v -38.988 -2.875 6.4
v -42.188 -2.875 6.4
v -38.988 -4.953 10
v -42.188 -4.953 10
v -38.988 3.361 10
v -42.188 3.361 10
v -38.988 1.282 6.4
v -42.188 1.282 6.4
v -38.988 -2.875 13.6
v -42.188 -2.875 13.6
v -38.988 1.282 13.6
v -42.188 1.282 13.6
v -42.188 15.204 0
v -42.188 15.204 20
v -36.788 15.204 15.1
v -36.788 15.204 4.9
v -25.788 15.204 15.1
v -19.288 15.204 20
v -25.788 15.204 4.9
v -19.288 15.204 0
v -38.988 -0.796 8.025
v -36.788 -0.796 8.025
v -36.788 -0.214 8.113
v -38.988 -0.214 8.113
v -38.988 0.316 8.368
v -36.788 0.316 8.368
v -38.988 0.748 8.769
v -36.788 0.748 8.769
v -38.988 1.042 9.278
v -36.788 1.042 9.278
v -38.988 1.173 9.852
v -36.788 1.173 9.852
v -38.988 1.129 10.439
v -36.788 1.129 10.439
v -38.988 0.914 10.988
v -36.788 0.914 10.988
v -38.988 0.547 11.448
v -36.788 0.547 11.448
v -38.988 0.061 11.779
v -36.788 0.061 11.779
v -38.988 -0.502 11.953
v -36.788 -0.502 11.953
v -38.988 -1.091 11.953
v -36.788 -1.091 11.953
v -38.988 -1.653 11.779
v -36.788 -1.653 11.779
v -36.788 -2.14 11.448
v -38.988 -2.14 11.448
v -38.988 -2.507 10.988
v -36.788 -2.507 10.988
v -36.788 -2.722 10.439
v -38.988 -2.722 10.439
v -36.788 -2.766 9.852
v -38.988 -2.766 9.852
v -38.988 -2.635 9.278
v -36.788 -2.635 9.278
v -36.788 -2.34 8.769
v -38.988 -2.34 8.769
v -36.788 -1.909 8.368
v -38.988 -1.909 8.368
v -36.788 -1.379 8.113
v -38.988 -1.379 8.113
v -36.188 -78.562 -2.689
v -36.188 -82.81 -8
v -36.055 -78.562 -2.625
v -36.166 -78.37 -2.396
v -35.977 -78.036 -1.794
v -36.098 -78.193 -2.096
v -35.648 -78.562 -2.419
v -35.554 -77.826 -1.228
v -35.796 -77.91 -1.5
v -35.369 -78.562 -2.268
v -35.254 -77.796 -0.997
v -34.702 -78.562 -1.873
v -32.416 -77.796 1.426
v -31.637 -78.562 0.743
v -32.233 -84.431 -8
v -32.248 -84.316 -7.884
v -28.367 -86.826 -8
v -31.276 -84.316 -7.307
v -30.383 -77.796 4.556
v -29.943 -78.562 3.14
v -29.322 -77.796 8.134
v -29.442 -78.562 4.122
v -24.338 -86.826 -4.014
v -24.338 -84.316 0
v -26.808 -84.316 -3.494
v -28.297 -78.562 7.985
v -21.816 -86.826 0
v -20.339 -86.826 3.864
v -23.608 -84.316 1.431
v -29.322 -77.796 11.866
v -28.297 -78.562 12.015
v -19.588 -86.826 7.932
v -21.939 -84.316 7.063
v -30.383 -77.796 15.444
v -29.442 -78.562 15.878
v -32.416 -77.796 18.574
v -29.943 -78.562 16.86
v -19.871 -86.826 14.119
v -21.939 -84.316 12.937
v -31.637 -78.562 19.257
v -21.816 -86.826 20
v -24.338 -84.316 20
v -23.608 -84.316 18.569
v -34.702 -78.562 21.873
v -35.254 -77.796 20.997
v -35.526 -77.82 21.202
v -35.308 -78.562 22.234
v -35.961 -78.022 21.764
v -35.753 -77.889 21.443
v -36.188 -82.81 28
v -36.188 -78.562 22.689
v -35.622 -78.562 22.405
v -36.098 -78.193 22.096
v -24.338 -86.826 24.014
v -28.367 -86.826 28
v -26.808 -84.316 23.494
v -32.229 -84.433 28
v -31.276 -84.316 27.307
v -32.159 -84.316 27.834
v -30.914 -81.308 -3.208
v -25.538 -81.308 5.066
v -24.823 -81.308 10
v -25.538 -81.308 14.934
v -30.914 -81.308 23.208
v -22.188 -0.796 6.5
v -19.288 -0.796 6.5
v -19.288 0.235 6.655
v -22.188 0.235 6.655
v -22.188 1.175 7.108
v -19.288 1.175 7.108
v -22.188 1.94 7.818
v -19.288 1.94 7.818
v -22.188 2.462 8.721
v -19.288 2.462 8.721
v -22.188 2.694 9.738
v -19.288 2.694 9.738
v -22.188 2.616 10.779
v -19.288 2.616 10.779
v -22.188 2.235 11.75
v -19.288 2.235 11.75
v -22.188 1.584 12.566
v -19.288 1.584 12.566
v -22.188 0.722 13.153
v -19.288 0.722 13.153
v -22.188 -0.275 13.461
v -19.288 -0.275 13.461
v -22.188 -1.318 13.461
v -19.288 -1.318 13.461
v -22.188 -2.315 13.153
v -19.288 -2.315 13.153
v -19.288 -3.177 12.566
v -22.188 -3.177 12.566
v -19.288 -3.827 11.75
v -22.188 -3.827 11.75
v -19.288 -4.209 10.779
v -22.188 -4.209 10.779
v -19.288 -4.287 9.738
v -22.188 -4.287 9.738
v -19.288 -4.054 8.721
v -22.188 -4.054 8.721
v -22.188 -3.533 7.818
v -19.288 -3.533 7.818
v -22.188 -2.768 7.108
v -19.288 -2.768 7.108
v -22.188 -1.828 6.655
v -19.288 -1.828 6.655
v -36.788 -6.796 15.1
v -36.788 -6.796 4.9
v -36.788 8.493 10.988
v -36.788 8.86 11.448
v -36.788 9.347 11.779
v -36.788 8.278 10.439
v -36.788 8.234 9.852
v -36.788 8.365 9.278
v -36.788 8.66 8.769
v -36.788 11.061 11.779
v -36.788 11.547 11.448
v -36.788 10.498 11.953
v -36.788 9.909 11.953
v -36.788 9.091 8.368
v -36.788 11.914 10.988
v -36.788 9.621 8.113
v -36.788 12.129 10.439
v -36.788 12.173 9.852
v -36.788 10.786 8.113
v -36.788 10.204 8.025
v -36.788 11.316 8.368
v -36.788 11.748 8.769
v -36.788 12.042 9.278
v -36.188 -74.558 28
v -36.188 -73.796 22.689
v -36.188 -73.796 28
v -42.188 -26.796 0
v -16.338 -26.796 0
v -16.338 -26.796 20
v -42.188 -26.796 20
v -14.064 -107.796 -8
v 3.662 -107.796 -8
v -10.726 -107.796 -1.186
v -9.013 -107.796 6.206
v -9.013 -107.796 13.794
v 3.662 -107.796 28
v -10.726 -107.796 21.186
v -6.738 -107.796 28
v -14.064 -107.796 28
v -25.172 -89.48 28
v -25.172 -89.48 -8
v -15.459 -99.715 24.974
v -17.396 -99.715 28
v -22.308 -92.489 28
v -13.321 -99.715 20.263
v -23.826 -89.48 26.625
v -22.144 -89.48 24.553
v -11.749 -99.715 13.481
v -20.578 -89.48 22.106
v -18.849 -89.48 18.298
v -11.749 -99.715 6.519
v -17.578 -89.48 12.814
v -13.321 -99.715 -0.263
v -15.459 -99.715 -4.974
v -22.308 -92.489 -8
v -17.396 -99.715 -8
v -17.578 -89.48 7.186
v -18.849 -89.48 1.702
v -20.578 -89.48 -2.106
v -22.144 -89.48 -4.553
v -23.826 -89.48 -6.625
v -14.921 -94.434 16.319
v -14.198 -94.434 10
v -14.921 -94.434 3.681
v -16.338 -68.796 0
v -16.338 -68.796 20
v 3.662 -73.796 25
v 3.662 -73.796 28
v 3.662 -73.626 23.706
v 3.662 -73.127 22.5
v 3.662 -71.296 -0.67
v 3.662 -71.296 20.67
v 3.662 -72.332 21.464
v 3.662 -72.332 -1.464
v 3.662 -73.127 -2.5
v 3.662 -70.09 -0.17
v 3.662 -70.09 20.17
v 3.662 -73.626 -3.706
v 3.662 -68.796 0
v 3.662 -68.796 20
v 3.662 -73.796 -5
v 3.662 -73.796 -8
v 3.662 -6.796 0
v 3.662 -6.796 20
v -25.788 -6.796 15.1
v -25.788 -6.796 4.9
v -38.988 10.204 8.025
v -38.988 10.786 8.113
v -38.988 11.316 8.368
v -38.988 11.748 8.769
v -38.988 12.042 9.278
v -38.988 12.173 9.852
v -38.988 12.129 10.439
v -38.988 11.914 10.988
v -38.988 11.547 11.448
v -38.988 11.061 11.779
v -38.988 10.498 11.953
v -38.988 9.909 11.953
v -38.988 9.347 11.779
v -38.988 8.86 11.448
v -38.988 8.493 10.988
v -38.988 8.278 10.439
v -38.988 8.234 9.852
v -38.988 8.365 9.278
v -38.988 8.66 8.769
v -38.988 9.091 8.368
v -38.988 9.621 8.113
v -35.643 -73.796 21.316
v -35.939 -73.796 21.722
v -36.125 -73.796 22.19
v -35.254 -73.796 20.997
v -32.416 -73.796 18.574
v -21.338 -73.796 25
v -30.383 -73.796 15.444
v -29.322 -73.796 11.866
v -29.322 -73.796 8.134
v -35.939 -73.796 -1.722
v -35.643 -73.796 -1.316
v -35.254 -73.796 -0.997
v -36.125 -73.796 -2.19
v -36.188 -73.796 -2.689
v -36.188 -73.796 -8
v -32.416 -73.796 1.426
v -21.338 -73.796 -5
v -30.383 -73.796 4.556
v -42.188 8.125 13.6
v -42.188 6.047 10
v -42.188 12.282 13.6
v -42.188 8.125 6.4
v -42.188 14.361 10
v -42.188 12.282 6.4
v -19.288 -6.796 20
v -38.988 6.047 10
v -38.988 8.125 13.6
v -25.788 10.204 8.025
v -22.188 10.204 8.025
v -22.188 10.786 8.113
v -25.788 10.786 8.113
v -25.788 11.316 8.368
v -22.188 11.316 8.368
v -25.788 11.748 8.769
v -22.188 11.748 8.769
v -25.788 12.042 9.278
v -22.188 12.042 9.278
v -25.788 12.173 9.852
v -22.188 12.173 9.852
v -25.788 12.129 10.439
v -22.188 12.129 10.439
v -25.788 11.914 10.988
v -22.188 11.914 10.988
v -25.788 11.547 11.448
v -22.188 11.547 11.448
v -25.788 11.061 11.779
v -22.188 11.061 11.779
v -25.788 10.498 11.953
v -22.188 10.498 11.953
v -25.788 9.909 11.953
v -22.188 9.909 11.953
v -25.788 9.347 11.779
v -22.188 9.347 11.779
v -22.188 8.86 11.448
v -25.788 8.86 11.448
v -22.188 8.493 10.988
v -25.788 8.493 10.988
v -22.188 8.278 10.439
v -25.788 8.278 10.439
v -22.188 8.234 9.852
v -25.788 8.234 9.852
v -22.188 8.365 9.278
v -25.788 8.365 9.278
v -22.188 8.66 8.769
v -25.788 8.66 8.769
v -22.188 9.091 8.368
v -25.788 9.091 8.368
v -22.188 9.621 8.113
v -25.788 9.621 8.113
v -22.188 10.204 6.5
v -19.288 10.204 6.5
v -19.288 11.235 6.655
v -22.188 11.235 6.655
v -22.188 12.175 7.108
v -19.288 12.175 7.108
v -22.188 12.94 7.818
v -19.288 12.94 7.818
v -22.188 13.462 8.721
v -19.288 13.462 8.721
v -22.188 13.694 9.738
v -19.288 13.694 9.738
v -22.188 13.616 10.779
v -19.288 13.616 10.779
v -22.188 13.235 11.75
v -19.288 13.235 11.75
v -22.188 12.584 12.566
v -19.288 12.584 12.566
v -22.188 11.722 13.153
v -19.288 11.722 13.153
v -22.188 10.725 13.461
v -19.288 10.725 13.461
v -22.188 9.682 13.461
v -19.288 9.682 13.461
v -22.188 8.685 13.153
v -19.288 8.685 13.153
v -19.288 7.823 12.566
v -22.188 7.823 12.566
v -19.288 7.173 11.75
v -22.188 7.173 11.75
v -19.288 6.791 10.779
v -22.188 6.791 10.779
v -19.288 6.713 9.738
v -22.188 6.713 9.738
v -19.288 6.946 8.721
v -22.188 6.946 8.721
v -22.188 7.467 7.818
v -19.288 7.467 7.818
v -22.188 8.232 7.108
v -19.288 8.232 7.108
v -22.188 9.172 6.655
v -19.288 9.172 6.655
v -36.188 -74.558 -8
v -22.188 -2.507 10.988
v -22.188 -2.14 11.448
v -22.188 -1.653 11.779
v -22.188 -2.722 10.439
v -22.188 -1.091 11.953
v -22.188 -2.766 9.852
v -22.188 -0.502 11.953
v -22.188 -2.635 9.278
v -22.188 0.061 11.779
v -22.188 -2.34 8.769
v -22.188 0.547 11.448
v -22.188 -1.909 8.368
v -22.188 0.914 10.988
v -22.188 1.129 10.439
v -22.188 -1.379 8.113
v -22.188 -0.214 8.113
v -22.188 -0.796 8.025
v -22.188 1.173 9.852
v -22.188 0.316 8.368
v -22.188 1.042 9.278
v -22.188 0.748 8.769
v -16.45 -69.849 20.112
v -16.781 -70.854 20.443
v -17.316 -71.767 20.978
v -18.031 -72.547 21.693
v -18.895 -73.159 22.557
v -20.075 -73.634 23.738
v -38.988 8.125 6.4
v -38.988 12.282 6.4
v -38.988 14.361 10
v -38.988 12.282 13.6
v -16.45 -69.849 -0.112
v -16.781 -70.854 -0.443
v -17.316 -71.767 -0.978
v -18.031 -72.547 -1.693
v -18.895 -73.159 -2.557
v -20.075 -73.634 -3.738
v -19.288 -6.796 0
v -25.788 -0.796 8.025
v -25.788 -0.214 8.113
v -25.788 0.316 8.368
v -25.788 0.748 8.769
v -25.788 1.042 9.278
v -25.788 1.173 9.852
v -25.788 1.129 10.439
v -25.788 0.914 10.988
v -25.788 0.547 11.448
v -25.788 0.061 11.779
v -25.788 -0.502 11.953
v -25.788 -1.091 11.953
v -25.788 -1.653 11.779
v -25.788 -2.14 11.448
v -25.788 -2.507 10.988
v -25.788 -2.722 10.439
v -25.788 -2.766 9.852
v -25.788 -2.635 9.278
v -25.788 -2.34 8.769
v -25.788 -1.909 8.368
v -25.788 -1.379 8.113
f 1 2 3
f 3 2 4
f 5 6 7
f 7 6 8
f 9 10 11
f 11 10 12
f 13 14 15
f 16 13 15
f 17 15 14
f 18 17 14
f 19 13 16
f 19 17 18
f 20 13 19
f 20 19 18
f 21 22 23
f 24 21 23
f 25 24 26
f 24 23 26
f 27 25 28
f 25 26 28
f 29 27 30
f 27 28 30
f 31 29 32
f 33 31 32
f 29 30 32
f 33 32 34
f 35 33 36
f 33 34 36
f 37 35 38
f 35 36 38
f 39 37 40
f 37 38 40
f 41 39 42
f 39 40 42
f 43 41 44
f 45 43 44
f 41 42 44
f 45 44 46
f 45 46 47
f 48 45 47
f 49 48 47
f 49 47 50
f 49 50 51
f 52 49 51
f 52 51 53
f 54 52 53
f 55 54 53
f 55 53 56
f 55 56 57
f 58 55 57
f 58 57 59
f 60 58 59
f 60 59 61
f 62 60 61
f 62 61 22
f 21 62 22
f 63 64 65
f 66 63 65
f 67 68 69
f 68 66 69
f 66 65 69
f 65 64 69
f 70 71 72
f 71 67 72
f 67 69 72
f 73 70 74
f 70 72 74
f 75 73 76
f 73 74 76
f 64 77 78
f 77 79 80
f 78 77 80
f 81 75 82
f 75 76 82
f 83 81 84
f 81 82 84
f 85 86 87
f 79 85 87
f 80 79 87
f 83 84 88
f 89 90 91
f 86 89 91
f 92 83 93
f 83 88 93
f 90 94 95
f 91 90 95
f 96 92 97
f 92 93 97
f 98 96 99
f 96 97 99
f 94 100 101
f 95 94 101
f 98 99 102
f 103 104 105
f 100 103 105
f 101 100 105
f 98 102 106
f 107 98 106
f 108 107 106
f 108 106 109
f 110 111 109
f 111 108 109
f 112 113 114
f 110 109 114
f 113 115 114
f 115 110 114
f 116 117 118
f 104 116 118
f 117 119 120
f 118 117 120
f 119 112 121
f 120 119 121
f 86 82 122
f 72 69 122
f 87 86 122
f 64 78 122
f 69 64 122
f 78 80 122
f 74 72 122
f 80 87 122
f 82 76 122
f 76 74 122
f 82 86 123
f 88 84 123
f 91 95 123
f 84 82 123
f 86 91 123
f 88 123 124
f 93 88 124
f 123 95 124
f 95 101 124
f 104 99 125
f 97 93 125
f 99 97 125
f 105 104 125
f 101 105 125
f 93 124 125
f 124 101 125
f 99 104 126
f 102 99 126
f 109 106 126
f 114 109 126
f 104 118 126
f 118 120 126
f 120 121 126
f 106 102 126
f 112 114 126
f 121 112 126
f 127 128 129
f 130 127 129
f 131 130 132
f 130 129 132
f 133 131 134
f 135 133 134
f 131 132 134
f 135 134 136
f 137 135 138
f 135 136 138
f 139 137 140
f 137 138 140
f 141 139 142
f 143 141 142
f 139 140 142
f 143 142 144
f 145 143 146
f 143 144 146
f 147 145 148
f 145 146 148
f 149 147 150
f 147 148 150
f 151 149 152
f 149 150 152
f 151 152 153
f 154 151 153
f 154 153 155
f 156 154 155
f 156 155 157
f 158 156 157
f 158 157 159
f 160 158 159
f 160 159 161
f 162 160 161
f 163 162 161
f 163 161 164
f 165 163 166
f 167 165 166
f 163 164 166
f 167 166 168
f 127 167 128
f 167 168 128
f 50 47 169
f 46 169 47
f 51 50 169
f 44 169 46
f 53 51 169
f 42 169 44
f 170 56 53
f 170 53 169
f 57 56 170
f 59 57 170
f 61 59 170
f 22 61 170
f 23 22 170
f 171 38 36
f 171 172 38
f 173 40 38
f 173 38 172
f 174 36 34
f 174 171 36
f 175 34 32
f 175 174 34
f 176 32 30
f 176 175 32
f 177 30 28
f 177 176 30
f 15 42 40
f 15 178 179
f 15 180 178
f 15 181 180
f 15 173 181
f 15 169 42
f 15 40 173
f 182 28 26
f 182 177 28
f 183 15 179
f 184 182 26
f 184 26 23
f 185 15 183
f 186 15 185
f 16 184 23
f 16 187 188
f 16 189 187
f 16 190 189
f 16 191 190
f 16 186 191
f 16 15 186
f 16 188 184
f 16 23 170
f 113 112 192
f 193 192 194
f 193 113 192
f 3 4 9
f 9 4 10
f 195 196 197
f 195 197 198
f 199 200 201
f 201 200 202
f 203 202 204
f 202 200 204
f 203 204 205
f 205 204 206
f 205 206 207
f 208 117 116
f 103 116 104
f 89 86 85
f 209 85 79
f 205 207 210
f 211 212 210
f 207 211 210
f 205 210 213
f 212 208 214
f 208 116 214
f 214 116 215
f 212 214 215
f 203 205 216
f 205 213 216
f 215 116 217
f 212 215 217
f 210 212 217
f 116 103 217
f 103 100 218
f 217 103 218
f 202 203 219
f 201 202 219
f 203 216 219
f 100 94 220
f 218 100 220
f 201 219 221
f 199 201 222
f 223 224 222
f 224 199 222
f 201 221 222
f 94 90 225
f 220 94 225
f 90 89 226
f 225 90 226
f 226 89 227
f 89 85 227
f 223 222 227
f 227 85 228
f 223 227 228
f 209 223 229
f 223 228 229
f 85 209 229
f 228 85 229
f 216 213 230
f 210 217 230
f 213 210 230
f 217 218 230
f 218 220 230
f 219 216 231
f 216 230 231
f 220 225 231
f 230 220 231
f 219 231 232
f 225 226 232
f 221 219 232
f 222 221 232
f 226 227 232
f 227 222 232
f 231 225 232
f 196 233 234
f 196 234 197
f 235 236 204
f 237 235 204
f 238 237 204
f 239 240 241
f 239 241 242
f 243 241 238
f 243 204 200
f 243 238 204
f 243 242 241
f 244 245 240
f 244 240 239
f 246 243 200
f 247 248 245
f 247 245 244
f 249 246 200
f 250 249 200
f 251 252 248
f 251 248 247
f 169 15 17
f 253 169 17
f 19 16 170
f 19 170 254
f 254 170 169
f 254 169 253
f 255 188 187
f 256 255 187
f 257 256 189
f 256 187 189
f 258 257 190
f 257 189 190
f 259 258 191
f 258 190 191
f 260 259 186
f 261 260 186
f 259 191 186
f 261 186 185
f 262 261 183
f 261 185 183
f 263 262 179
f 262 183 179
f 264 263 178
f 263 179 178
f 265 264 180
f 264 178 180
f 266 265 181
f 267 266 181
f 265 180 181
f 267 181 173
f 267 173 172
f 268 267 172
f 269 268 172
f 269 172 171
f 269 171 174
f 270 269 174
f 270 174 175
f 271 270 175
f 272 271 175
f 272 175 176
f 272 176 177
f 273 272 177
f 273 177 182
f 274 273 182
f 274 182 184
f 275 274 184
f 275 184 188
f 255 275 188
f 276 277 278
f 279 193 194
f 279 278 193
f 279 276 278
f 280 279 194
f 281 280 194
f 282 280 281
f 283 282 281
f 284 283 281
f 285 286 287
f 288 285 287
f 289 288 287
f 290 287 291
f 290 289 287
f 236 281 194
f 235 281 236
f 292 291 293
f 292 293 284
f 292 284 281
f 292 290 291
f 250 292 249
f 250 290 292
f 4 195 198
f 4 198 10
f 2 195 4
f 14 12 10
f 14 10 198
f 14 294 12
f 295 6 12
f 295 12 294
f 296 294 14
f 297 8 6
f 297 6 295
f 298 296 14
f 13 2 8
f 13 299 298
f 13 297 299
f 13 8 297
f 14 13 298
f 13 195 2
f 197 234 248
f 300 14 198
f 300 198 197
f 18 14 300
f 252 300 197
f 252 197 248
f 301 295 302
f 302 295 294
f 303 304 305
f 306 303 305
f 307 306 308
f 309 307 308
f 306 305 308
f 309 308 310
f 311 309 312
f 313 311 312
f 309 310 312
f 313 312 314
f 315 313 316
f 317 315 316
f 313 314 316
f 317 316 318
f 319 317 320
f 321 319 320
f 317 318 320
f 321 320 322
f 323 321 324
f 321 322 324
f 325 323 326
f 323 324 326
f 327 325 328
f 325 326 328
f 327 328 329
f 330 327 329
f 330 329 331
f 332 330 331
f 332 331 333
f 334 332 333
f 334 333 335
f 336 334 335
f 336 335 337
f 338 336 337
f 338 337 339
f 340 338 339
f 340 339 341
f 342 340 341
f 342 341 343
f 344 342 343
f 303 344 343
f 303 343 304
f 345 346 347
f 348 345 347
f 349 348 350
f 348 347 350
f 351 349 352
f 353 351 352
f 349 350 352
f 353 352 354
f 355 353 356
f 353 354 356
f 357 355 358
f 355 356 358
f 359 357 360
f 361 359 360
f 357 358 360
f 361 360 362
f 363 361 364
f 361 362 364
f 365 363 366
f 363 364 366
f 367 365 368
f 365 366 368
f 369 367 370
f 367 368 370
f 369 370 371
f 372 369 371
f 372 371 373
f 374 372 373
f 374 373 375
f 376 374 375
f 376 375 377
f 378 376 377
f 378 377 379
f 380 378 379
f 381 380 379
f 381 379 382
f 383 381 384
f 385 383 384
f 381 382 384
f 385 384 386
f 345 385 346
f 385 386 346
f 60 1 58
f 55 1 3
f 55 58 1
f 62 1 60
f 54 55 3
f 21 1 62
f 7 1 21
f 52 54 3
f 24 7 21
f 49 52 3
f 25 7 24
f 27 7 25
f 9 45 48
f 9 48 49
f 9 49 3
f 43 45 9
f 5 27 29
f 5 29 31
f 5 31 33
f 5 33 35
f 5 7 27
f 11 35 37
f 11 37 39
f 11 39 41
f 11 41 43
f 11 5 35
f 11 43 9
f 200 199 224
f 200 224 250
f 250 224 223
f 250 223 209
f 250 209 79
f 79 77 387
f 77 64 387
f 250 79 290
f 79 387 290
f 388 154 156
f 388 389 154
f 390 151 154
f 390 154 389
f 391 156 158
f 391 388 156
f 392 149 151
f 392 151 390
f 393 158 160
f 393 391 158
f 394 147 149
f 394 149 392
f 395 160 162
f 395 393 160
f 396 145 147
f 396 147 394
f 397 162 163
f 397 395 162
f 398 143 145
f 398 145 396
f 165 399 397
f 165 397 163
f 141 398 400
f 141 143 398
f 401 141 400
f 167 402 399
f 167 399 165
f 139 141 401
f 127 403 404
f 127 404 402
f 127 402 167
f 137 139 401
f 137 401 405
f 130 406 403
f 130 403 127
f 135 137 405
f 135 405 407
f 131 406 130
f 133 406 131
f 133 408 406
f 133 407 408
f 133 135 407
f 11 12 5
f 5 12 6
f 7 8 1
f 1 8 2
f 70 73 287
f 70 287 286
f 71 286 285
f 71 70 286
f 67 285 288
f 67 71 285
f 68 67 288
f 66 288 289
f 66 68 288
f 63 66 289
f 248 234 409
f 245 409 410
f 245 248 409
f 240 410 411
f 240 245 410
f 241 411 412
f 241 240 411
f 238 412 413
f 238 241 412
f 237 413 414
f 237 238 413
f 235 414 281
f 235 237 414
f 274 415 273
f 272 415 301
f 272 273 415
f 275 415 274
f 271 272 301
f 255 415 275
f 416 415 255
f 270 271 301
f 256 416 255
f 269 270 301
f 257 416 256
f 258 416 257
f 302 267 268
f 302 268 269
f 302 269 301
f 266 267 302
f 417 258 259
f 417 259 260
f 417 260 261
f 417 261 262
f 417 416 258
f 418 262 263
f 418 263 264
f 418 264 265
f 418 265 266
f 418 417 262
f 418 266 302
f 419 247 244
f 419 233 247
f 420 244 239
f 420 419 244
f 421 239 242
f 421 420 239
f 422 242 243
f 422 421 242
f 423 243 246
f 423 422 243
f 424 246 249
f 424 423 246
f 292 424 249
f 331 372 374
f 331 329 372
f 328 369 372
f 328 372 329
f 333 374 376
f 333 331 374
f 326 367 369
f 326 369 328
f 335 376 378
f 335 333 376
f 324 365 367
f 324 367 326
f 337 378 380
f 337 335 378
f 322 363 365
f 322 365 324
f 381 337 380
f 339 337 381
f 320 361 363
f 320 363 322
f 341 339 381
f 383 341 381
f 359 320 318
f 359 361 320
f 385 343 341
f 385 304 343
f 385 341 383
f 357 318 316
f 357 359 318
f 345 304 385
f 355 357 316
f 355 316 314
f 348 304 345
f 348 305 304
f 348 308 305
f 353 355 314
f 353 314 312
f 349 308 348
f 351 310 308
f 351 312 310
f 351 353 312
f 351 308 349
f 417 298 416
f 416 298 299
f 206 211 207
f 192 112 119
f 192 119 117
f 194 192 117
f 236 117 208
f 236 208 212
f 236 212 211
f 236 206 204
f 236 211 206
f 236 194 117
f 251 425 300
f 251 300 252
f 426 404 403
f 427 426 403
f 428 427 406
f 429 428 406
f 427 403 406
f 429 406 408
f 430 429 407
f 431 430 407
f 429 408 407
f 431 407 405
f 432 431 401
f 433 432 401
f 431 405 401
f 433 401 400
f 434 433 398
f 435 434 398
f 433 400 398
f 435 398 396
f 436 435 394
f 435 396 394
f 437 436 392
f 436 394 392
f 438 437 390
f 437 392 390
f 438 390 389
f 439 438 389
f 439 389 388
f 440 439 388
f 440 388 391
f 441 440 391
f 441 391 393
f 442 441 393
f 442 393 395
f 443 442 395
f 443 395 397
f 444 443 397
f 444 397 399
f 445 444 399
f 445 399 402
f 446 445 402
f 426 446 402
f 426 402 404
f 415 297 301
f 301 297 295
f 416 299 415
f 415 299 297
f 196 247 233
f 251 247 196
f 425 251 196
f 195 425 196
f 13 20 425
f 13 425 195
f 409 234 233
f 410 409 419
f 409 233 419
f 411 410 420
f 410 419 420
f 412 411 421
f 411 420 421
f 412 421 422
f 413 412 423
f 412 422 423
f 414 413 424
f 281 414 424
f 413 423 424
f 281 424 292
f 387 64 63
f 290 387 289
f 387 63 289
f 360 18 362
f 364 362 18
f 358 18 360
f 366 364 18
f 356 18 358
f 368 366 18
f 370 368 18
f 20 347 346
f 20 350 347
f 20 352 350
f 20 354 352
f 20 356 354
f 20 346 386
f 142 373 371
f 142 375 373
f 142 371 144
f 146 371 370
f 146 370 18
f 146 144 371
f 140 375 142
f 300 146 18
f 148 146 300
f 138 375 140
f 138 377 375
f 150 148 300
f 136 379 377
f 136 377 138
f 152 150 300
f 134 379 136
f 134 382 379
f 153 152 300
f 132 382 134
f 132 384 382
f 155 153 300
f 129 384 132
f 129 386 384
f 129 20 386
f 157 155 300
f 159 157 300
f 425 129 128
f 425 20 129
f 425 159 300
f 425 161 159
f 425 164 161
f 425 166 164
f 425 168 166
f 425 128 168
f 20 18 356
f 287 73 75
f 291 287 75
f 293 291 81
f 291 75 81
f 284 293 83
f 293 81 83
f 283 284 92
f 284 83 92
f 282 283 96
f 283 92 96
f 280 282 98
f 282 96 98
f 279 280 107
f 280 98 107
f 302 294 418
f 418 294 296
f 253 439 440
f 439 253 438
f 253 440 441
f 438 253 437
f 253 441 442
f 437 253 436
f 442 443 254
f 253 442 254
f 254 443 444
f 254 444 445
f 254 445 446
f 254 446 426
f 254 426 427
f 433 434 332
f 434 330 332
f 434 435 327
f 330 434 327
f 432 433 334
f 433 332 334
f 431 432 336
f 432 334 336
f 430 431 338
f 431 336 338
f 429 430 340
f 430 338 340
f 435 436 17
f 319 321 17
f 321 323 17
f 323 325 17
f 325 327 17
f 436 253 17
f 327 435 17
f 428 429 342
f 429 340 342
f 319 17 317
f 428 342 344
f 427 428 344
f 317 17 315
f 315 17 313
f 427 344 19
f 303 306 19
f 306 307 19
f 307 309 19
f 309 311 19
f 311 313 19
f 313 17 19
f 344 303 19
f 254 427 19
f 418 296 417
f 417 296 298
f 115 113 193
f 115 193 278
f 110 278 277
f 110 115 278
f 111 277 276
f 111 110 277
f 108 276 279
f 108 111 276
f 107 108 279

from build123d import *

# Parameters (mm, degrees)
EXTRUDE_6_DEPTH           = 20
SKETCH_6_W                = 17.85
SKETCH_6_H                = 4
EXTRUDE_7_DEPTH           = 8
SKETCH_7_W                = 17.85
SKETCH_7_H                = 4
EXTRUDE_8_DEPTH           = 8
SKETCH_10_R               = 1.975
CUT_EXTRUDE_5_DEPTH       = 23.9
SKETCH_9_W                = 11
SKETCH_9_H                = 10.2
CUT_EXTRUDE_7_DEPTH       = 22
SKETCH_12_R               = 3.5
CUT_EXTRUDE_8_DEPTH       = 2.9
CUT_EXTRUDE_9_DEPTH       = 3.2
EXTRUDE_11_DEPTH          = 4
EXTRUDE_START             = -20
EXTRUDE_12_DEPTH          = 20
CUT_EXTRUDE_12_DEPTH      = 10
SKETCH_20_W               = 6
SKETCH_20_H               = 4
CUT_EXTRUDE_13_DEPTH      = 10
REVOLVE_1_ANGLE           = 180
EXTRUDE_13_DEPTH          = 30
SKETCH_38_W               = 28
SKETCH_38_H               = 8
EXTRUDE_14_DEPTH          = 34
SKETCH_37_W               = 8.80839151
SKETCH_37_H               = 35.661760673
CUT_EXTRUDE_15_DEPTH      = 22.758116413
CUT_EXTRUDE_15_DEPTH_BACK = 58.758116413
SKETCH_40_W               = 21.302771057
SKETCH_40_H               = 34
CUT_EXTRUDE_16_DEPTH      = 7
CUT_EXTRUDE_16_DEPTH_BACK = 40.8500001
SKETCH_42_W               = 6
SKETCH_42_H               = 6
CUT_EXTRUDE_17_DEPTH      = 29.0000001
FILLET_1_R                = 5
FILLET_2_R                = 2


with BuildPart() as part:
    # 스케치1 → 보스-돌출6 (new body)
    with BuildSketch(Plane.XY):
        Polygon((-42.18773019, 15.20361991), (-19.28773019, 15.20361991), (-19.28773019, -6.79638009), (3.66226981, -6.79638009), (3.66226981, -77.79638009), (-42.18773019, -77.79638009), (-42.18773019, -73.79638009), (-16.33773019, -73.79638009), (-16.33773019, -26.79638009), (-42.18773019, -26.79638009), align=None)
    extrude(amount=EXTRUDE_6_DEPTH)

    # 스케치6 → 보스-돌출7 (add)
    with BuildSketch(Plane.XY.offset(20)):
        with Locations((-33.26273019, -75.79638009)):
            Rectangle(SKETCH_6_W, SKETCH_6_H)
    extrude(amount=EXTRUDE_7_DEPTH)

    # 스케치7 → 보스-돌출8 (add)
    with BuildSketch(Plane(origin=(0, 0, 0), x_dir=(-1, 0, 0), z_dir=(0, 0, -1))):
        with Locations((33.26273019, -75.79638009)):
            Rectangle(SKETCH_7_W, SKETCH_7_H)
    extrude(amount=EXTRUDE_8_DEPTH)

    # 스케치10 → 컷-돌출5 (cut, through all)
    with BuildSketch(Plane(origin=(-19.28773019, 0, 0), x_dir=(0, 0, -1), z_dir=(1, 0, 0))):
        with Locations((-10, 10.20361991)):
            Circle(SKETCH_10_R)
        with Locations((-10, -0.79638009)):
            Circle(SKETCH_10_R)
    extrude(amount=-CUT_EXTRUDE_5_DEPTH, mode=Mode.SUBTRACT)

    # 스케치9 → 컷-돌출7 (cut)
    with BuildSketch(Plane(origin=(0, 15.20361991, 0), x_dir=(1, 0, 0), z_dir=(0, 1, 0))):
        with Locations((-31.28773019, -10)):
            Rectangle(SKETCH_9_W, SKETCH_9_H)
    extrude(amount=-CUT_EXTRUDE_7_DEPTH, mode=Mode.SUBTRACT)

    # 스케치12 → 컷-돌출8 (cut)
    with BuildSketch(Plane(origin=(-19.28773019, 0, 0), x_dir=(0, 0, -1), z_dir=(1, 0, 0))):
        with Locations((-10, 10.20361991)):
            Circle(SKETCH_12_R)
        with Locations((-10, -0.79638009)):
            Circle(SKETCH_12_R)
    extrude(amount=-CUT_EXTRUDE_8_DEPTH, mode=Mode.SUBTRACT)

    # 스케치13 → 컷-돌출9 (cut)
    with BuildSketch(Plane.ZY.offset(42.18773019)):
        Polygon((10, 14.360541848), (6.4, 12.282080879), (6.4, 8.12515894), (10, 6.046697971), (13.6, 8.12515894), (13.6, 12.282080879), align=None)
        Polygon((10, 3.360541848), (6.4, 1.282080879), (6.4, -2.87484106), (10, -4.953302029), (13.6, -2.87484106), (13.6, 1.282080879), align=None)
    extrude(amount=-CUT_EXTRUDE_9_DEPTH, mode=Mode.SUBTRACT)

    # 스케치16 → 보스-돌출11 (add)
    with BuildSketch(Plane(origin=(0, -73.79638009, 0), x_dir=(1, 0, 0), z_dir=(0, 1, 0))):
        with BuildLine():
            Line((-16.33773019, -20), (-24.33773019, -20))
            Line((-24.33773019, -20), (-24.33773019, -28))
            ThreePointArc((-24.33773019, -28), (-18.680875941, -25.656854249), (-16.33773019, -20))
        make_face()
        with BuildLine():
            Line((-16.33773019, 0), (-24.33773019, 0))
            Line((-24.33773019, 0), (-24.33773019, 8))
            ThreePointArc((-24.33773019, 8), (-18.680875941, 5.656854249), (-16.33773019, 0))
        make_face()
    extrude(amount=-EXTRUDE_11_DEPTH)

    # 스케치17 → 보스-돌출12 (add)
    with BuildSketch(Plane.XY.offset(20).offset(EXTRUDE_START)):
        with BuildLine():
            Line((-22.33773019, -73.79638009), (-16.33773019, -73.79638009))
            Line((-16.33773019, -73.79638009), (-16.33773019, -67.79638009))
            ThreePointArc((-16.33773019, -67.79638009), (-18.095089503, -72.039020778), (-22.33773019, -73.79638009))
        make_face()
    extrude(amount=EXTRUDE_12_DEPTH)

    # 스케치8 → 컷-돌출12 (cut)
    with BuildSketch(Plane.XZ.offset(77.79638009)):
        with BuildLine():
            Line((-42.18773019, 23), (-42.18773019, -3))
            ThreePointArc((-42.18773019, -3), (-29.18773019, 10), (-42.18773019, 23))
        make_face()
    extrude(amount=-CUT_EXTRUDE_12_DEPTH, mode=Mode.SUBTRACT)

    # 스케치20 → 컷-돌출13 (cut)
    with BuildSketch(Plane.XY.offset(28)):
        with Locations((-39.18773019, -75.79638009)):
            Rectangle(SKETCH_20_W, SKETCH_20_H)
    extrude(amount=-CUT_EXTRUDE_13_DEPTH, mode=Mode.SUBTRACT)

    # 스케치32 → 회전1 (revolve)
    with BuildSketch(Plane.ZY.offset(42.18773019)):
        with BuildLine():
            Line((-8, -77.79638009), (-3, -77.79638009))
            ThreePointArc((-3, -77.79638009), (-15.841250436, -90.997978116), (-23.39066063, -107.79638009))
            Line((-23.39066063, -107.79638009), (-29.758116313, -107.79638009))
            ThreePointArc((-29.758116313, -107.79638009), (-21.866282132, -88.884722246), (-8, -73.79638009))
            Line((-8, -73.79638009), (-8, -77.79638009))
        make_face()
    revolve(axis=Axis((-42.18773019, -67.79638009, 10), (0, -1, 0)), revolution_arc=REVOLVE_1_ANGLE)

    # 스케치33 → 보스-돌출13 (add)
    with BuildSketch(Plane.XZ.offset(77.79638009)):
        with BuildLine():
            Line((3.66226981, 20), (3.66226981, 0))
            Line((3.66226981, 0), (-16.33773019, 0))
            ThreePointArc((-16.33773019, 0), (-18.680875941, -5.656854249), (-24.33773019, -8))
            Line((-24.33773019, -8), (-28.366850202, -8))
            ThreePointArc((-28.366850202, -8), (-19.493750292, 10), (-28.366850202, 28))
            Line((-28.366850202, 28), (-24.33773019, 28))
            ThreePointArc((-24.33773019, 28), (-18.680875941, 25.656854249), (-16.33773019, 20))
            Line((-16.33773019, 20), (3.66226981, 20))
        make_face()
    extrude(amount=EXTRUDE_13_DEPTH)

    # 스케치38 → 보스-돌출14 (add)
    with BuildSketch(Plane(origin=(0, -73.79638009, 0), x_dir=(1, 0, 0), z_dir=(0, 1, 0))):
        with Locations((-10.33773019, 4)):
            Rectangle(SKETCH_38_W, SKETCH_38_H)
        with Locations((-10.33773019, -24)):
            Rectangle(SKETCH_38_W, SKETCH_38_H)
    extrude(amount=-EXTRUDE_14_DEPTH)

    # 스케치39 → 컷-회전1 (revolve, cut)
    with BuildSketch(Plane.ZY.offset(42.18773019)):
        with BuildLine():
            Line((10, -107.79638009), (-23.39066063, -107.79638009))
            ThreePointArc((-23.39066063, -107.79638009), (-15.841250436, -90.997978116), (-3, -77.79638009))
            Line((-3, -77.79638009), (10, -77.79638009))
            Line((10, -77.79638009), (10, -107.79638009))
        make_face()
    revolve(axis=Axis((-42.18773019, -107.79638009, 10), (0, 1, 0)), mode=Mode.SUBTRACT)

    # 스케치37 → 컷-돌출15 (cut, two sides)
    with BuildSketch(Plane.XY.offset(28)) as cut_extrude_15_sk:
        with Locations((-40.591925945, -91.627260427)):
            Rectangle(SKETCH_37_W, SKETCH_37_H)
    extrude(amount=CUT_EXTRUDE_15_DEPTH, mode=Mode.SUBTRACT)
    extrude(cut_extrude_15_sk.sketch, amount=-CUT_EXTRUDE_15_DEPTH_BACK, mode=Mode.SUBTRACT)

    # 스케치40 → 컷-돌출16 (cut, two sides)
    with BuildSketch(Plane.ZY.offset(36.18773019)) as cut_extrude_16_sk:
        with Locations((-18.651385529, -90.79638009)):
            Rectangle(SKETCH_40_W, SKETCH_40_H)
        with Locations((38.651385529, -90.79638009)):
            Rectangle(SKETCH_40_W, SKETCH_40_H)
    extrude(amount=CUT_EXTRUDE_16_DEPTH, mode=Mode.SUBTRACT)
    extrude(cut_extrude_16_sk.sketch, amount=-CUT_EXTRUDE_16_DEPTH_BACK, mode=Mode.SUBTRACT)

    # 스케치42 → 컷-돌출17 (cut, through all)
    with BuildSketch(Plane.XY.offset(20)):
        with Locations((-19.33773019, -70.79638009)):
            Rectangle(SKETCH_42_W, SKETCH_42_H)
    extrude(amount=-CUT_EXTRUDE_17_DEPTH, mode=Mode.SUBTRACT)

    # 필렛1
    fillet_1_edges = [part.edges().sort_by_distance(p)[0] for p in [
        (-6.33773019, -73.79638009, 20),
        (-6.33773019, -73.79638009, 0),
        (-16.33773019, -73.79638009, 10),
    ]]
    fillet(fillet_1_edges, radius=FILLET_1_R)

    # 필렛2
    fillet_2_edges = [part.edges().sort_by_distance(p)[0] for p in [
        (-36.18773019, -75.79638009, 21.532562595),
        (-36.18773019, -75.79638009, -1.532562595),
    ]]
    fillet(fillet_2_edges, radius=FILLET_2_R)


solid = part.part
